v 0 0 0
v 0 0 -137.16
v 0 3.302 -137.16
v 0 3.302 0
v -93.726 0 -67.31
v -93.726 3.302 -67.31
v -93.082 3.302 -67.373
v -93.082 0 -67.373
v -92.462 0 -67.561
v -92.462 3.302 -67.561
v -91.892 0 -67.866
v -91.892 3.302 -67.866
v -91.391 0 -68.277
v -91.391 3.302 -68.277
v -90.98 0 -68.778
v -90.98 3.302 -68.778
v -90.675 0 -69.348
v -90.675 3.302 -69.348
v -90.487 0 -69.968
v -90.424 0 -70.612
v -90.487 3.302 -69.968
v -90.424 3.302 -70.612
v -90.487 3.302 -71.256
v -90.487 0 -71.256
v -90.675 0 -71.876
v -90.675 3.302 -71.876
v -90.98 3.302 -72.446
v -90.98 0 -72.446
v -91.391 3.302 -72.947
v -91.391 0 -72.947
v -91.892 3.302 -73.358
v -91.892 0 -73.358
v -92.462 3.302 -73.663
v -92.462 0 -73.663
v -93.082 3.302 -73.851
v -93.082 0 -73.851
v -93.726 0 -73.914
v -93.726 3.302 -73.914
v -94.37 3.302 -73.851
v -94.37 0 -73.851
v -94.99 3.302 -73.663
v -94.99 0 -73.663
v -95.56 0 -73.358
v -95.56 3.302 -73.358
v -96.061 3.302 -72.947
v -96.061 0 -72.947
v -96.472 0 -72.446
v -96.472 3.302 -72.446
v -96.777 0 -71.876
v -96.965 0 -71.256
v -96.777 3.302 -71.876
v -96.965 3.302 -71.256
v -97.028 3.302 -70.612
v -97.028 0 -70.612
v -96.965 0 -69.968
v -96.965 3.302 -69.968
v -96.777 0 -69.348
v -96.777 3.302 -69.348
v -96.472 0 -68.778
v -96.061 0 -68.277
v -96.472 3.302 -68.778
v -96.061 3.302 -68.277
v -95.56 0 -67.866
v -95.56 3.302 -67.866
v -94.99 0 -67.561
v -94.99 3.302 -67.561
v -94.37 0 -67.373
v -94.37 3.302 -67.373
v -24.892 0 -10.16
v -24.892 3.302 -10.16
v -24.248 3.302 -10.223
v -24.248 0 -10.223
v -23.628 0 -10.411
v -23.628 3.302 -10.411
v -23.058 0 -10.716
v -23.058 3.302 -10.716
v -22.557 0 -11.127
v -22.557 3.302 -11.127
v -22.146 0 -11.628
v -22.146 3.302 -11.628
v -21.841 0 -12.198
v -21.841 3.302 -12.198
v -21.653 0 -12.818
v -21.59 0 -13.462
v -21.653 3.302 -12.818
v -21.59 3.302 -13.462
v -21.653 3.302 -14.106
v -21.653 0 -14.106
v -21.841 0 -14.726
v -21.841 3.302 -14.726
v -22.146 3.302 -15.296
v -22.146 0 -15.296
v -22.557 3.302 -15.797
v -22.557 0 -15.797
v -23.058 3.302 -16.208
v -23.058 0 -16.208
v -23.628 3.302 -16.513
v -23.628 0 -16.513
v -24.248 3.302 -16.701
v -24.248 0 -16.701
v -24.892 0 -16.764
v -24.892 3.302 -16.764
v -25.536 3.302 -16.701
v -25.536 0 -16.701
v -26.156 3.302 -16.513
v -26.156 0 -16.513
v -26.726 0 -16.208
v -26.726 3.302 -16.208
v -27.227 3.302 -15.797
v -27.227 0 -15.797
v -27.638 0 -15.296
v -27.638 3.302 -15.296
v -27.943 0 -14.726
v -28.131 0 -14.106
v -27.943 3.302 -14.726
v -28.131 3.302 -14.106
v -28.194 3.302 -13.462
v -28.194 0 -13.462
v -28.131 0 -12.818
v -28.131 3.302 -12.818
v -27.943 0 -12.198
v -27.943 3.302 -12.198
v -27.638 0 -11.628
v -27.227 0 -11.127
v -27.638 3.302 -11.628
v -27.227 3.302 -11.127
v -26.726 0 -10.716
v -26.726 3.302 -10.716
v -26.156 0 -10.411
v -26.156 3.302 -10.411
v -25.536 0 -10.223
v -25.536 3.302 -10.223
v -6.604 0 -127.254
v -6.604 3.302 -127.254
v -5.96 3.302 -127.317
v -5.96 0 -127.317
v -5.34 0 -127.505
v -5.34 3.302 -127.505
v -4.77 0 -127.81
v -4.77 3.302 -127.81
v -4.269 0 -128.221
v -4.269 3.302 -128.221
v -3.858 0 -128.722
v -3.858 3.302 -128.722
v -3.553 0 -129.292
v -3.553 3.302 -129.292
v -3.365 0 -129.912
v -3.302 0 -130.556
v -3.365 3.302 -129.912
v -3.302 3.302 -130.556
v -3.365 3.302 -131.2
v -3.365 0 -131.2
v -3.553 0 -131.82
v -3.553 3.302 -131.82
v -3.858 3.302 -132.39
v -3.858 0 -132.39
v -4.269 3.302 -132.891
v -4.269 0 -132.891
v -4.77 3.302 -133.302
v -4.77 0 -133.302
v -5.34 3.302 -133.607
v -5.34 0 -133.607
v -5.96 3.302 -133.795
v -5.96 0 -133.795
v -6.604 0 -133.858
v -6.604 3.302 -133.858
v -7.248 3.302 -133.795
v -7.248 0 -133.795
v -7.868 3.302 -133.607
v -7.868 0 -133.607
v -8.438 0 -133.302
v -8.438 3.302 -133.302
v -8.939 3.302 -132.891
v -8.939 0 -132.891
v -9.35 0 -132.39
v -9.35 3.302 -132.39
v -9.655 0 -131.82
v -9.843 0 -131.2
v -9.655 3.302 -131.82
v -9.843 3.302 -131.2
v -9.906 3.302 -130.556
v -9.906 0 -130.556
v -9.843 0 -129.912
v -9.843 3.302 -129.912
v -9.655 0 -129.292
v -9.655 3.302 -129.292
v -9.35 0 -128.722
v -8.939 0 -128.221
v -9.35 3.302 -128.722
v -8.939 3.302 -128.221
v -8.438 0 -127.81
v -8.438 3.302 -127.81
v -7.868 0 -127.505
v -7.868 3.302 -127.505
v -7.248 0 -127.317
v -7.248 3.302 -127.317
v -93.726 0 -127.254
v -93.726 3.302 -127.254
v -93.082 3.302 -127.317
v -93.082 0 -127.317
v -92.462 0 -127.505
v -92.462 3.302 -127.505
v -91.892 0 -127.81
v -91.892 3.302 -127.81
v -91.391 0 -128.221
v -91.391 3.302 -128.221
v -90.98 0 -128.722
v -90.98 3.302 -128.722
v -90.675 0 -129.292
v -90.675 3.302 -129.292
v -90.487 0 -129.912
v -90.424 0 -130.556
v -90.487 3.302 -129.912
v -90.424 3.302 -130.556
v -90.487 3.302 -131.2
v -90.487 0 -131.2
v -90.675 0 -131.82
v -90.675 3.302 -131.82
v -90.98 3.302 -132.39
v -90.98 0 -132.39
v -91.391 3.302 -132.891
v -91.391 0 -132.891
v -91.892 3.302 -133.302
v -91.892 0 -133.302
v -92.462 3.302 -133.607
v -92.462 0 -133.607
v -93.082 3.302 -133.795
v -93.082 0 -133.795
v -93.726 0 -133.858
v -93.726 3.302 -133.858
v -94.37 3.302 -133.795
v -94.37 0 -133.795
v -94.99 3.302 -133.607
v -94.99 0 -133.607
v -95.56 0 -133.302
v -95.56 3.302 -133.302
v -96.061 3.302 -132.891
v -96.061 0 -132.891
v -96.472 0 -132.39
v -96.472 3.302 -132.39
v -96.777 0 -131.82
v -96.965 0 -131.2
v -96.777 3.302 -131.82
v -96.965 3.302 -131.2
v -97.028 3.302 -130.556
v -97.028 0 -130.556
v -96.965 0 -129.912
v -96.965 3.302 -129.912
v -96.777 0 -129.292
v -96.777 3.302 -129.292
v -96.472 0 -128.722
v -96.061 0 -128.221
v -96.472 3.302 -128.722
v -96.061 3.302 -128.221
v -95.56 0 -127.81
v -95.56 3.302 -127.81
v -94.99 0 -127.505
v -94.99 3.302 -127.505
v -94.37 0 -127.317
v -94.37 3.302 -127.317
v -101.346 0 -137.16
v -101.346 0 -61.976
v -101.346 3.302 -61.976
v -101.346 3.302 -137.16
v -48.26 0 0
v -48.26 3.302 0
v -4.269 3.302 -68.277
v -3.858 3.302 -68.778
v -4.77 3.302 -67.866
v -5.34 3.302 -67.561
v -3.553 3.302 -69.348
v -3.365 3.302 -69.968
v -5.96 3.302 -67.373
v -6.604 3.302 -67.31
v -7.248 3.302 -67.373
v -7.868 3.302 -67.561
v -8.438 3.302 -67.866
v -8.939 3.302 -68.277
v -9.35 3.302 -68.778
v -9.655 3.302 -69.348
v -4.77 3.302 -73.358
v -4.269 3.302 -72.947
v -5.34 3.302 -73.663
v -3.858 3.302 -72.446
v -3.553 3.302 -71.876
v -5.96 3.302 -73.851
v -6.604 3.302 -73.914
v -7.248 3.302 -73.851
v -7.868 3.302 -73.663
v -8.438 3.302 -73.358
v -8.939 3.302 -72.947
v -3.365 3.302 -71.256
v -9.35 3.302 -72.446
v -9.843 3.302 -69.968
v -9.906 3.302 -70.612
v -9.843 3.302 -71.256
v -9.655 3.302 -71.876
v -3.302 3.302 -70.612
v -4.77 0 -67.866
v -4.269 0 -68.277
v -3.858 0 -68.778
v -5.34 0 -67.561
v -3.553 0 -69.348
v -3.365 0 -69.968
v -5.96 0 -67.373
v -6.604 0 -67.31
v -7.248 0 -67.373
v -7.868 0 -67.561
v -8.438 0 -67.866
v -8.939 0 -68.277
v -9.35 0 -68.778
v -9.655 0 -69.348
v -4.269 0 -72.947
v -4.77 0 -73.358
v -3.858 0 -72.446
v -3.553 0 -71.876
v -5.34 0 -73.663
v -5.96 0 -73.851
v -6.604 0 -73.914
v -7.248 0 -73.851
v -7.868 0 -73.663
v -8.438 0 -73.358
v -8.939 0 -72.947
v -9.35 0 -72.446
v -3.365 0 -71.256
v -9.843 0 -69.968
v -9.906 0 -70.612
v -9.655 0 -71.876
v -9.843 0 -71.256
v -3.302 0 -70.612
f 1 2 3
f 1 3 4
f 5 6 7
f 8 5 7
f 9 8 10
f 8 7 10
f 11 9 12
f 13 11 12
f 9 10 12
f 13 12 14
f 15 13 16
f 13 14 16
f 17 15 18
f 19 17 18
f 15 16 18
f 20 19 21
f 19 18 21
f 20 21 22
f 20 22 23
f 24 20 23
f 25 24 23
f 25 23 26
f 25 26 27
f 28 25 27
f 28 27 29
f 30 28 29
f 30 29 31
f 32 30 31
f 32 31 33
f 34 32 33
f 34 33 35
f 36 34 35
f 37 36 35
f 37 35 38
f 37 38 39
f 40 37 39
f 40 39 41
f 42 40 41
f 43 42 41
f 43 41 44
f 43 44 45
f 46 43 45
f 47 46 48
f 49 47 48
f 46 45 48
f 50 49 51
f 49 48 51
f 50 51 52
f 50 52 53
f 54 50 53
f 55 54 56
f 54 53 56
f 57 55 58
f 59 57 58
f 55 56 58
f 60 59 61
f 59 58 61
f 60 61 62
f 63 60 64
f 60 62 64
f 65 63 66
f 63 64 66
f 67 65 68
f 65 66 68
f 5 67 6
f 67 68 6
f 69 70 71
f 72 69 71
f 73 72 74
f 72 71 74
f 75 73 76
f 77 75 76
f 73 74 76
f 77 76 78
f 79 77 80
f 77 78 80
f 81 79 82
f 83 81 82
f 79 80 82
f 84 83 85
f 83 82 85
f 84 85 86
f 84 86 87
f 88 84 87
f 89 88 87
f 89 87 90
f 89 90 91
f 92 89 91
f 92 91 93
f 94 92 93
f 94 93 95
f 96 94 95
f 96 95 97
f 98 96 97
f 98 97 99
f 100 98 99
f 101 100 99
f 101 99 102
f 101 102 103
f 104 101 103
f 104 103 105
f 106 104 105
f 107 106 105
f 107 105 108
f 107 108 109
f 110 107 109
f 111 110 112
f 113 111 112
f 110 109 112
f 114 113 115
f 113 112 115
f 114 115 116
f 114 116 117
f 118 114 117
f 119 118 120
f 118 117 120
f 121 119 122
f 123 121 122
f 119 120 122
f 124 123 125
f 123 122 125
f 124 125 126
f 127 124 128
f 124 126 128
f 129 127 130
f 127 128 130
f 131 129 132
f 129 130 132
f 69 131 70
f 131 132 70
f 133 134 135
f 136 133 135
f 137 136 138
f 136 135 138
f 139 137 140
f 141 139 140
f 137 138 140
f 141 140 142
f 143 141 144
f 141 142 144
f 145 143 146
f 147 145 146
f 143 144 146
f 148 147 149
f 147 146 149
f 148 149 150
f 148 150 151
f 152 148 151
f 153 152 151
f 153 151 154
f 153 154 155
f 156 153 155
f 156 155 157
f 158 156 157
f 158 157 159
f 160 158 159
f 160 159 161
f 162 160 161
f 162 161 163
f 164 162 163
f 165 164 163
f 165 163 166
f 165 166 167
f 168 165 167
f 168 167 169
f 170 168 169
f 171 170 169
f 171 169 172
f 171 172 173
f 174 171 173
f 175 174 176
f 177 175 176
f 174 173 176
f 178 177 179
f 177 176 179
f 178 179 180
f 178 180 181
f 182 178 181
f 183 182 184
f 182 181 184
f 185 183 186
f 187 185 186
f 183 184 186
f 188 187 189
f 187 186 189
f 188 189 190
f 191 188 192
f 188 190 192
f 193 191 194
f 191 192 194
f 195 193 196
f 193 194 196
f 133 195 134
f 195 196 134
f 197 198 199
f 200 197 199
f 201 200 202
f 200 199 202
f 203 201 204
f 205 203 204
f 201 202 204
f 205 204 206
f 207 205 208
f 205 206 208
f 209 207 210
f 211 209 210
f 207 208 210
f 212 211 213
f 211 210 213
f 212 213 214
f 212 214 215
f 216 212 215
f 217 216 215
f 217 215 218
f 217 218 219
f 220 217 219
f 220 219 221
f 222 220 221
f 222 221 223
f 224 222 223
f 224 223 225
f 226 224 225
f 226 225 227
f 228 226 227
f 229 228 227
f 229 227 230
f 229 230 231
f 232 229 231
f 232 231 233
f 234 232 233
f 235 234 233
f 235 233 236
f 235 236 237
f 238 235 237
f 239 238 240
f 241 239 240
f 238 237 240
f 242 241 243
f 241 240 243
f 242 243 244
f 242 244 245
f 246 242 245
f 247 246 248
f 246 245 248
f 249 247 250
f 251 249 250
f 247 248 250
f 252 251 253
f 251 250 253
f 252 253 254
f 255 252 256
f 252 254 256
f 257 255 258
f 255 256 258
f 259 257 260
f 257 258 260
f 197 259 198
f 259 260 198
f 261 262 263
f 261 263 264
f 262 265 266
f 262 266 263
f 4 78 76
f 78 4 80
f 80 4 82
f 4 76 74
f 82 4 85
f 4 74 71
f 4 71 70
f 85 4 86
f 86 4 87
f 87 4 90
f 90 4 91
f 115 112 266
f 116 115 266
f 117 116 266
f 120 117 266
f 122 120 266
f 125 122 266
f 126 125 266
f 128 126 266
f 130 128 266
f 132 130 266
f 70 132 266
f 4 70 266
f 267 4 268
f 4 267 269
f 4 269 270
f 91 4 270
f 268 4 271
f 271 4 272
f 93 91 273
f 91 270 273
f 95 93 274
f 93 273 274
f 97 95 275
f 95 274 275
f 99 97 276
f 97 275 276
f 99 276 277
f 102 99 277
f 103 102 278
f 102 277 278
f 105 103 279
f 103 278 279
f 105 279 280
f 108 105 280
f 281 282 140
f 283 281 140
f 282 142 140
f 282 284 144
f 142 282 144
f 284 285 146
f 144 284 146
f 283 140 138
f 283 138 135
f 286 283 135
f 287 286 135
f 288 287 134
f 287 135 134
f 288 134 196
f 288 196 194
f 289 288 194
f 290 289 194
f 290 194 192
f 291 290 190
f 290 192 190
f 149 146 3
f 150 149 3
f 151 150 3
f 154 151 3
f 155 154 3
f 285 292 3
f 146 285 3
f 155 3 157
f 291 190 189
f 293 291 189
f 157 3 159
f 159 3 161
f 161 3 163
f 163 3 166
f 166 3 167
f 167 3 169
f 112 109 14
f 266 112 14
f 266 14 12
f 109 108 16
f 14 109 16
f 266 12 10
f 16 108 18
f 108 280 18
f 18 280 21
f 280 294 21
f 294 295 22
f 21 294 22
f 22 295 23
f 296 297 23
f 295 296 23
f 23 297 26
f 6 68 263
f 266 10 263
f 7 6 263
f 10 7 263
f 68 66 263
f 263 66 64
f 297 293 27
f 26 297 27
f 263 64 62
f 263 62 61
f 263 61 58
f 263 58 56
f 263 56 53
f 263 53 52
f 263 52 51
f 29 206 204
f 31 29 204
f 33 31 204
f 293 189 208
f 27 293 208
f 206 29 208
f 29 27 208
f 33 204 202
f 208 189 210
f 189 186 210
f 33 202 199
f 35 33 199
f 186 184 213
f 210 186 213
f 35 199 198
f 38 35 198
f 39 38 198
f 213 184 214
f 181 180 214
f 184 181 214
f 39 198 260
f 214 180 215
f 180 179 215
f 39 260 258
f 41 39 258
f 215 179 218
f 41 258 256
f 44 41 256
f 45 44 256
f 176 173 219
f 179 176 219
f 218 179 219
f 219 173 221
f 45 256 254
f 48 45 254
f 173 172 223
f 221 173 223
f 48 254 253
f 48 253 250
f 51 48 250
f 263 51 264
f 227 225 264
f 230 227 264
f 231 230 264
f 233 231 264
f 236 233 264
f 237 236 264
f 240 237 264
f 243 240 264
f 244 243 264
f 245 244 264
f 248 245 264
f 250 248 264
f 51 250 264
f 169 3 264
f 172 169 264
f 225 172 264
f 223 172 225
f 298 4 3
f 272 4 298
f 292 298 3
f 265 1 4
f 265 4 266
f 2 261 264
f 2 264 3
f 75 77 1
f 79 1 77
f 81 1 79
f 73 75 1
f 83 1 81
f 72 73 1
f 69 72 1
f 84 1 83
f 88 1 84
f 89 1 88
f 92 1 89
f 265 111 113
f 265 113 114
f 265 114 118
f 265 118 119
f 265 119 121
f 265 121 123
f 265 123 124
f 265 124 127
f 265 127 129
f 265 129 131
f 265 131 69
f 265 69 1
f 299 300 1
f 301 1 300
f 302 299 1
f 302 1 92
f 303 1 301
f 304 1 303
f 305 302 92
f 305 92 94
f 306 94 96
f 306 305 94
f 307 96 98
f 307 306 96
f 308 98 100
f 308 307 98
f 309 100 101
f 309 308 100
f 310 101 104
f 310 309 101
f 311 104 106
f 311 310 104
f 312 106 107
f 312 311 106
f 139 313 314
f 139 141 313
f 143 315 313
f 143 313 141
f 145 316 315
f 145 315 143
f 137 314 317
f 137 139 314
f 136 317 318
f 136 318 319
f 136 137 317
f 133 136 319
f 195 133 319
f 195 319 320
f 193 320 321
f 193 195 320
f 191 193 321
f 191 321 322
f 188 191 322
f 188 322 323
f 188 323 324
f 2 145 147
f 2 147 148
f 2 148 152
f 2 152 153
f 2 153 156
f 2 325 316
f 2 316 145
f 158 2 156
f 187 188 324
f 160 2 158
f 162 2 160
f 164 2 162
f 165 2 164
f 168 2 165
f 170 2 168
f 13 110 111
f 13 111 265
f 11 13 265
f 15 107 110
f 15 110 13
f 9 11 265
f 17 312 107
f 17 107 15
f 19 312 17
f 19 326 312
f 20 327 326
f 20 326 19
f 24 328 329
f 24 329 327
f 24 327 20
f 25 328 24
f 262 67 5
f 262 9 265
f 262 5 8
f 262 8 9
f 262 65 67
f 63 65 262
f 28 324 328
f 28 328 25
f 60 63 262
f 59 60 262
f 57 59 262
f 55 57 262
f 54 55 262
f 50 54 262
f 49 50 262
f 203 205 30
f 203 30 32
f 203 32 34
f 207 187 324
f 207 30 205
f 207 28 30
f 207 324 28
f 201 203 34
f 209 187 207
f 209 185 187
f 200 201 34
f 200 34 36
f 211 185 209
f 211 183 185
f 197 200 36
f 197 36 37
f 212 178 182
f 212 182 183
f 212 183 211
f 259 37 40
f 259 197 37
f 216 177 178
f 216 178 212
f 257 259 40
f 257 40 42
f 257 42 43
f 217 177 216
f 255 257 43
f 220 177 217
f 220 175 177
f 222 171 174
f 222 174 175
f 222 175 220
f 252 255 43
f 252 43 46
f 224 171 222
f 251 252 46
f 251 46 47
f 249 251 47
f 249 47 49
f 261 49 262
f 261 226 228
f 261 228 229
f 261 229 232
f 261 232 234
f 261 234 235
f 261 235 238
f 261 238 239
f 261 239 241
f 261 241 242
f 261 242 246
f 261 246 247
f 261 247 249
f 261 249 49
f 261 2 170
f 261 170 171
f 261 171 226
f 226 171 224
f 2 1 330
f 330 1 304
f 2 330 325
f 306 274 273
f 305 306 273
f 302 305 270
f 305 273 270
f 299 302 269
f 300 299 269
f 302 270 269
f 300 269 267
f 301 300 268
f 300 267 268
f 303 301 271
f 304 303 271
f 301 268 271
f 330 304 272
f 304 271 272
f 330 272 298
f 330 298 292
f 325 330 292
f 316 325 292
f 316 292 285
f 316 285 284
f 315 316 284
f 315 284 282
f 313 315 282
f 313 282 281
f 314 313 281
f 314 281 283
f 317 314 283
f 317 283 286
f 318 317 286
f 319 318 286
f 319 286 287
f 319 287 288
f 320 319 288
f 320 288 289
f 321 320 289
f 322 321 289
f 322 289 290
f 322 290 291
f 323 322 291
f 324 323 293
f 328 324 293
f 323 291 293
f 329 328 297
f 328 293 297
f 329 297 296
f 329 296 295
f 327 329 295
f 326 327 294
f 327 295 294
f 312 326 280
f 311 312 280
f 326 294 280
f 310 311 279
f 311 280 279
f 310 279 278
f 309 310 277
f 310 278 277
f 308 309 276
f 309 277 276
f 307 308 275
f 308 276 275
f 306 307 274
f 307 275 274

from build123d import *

# Parameters (mm, degrees)
BOSS_EXTRUDE1_DEPTH = 3.302
SKETCH2_R           = 3.302
CUT_EXTRUDE1_DEPTH  = 23.368


with BuildPart() as part:
    # Sketch1 → Boss-Extrude1 (new body)
    with BuildSketch(Plane(origin=(0, 0, 0), x_dir=(1, 0, 0), z_dir=(0, 1, 0))):
        Polygon((0, 0), (-48.26, 0), (-101.346, 61.976), (-101.346, 137.16), (0, 137.16), align=None)
    extrude(amount=BOSS_EXTRUDE1_DEPTH)

    # Sketch2 → Cut-Extrude1 (cut)
    with BuildSketch(Plane(origin=(0, 3.302, 0), x_dir=(1, 0, 0), z_dir=(0, 1, 0))):
        with Locations(Location((-93.726, 70.612, 0), (0, 0, 270))):
            Circle(SKETCH2_R)
        with Locations(Location((-24.892, 13.462, 0), (0, 0, 270))):
            Circle(SKETCH2_R)
        with Locations(Location((-6.604, 70.612, 0), (0, 0, 270))):
            Circle(SKETCH2_R)
        with Locations(Location((-6.604, 130.556, 0), (0, 0, 270))):
            Circle(SKETCH2_R)
        with Locations(Location((-93.726, 130.556, 0), (0, 0, 270))):
            Circle(SKETCH2_R)
    extrude(amount=-CUT_EXTRUDE1_DEPTH, mode=Mode.SUBTRACT)


solid = part.part
